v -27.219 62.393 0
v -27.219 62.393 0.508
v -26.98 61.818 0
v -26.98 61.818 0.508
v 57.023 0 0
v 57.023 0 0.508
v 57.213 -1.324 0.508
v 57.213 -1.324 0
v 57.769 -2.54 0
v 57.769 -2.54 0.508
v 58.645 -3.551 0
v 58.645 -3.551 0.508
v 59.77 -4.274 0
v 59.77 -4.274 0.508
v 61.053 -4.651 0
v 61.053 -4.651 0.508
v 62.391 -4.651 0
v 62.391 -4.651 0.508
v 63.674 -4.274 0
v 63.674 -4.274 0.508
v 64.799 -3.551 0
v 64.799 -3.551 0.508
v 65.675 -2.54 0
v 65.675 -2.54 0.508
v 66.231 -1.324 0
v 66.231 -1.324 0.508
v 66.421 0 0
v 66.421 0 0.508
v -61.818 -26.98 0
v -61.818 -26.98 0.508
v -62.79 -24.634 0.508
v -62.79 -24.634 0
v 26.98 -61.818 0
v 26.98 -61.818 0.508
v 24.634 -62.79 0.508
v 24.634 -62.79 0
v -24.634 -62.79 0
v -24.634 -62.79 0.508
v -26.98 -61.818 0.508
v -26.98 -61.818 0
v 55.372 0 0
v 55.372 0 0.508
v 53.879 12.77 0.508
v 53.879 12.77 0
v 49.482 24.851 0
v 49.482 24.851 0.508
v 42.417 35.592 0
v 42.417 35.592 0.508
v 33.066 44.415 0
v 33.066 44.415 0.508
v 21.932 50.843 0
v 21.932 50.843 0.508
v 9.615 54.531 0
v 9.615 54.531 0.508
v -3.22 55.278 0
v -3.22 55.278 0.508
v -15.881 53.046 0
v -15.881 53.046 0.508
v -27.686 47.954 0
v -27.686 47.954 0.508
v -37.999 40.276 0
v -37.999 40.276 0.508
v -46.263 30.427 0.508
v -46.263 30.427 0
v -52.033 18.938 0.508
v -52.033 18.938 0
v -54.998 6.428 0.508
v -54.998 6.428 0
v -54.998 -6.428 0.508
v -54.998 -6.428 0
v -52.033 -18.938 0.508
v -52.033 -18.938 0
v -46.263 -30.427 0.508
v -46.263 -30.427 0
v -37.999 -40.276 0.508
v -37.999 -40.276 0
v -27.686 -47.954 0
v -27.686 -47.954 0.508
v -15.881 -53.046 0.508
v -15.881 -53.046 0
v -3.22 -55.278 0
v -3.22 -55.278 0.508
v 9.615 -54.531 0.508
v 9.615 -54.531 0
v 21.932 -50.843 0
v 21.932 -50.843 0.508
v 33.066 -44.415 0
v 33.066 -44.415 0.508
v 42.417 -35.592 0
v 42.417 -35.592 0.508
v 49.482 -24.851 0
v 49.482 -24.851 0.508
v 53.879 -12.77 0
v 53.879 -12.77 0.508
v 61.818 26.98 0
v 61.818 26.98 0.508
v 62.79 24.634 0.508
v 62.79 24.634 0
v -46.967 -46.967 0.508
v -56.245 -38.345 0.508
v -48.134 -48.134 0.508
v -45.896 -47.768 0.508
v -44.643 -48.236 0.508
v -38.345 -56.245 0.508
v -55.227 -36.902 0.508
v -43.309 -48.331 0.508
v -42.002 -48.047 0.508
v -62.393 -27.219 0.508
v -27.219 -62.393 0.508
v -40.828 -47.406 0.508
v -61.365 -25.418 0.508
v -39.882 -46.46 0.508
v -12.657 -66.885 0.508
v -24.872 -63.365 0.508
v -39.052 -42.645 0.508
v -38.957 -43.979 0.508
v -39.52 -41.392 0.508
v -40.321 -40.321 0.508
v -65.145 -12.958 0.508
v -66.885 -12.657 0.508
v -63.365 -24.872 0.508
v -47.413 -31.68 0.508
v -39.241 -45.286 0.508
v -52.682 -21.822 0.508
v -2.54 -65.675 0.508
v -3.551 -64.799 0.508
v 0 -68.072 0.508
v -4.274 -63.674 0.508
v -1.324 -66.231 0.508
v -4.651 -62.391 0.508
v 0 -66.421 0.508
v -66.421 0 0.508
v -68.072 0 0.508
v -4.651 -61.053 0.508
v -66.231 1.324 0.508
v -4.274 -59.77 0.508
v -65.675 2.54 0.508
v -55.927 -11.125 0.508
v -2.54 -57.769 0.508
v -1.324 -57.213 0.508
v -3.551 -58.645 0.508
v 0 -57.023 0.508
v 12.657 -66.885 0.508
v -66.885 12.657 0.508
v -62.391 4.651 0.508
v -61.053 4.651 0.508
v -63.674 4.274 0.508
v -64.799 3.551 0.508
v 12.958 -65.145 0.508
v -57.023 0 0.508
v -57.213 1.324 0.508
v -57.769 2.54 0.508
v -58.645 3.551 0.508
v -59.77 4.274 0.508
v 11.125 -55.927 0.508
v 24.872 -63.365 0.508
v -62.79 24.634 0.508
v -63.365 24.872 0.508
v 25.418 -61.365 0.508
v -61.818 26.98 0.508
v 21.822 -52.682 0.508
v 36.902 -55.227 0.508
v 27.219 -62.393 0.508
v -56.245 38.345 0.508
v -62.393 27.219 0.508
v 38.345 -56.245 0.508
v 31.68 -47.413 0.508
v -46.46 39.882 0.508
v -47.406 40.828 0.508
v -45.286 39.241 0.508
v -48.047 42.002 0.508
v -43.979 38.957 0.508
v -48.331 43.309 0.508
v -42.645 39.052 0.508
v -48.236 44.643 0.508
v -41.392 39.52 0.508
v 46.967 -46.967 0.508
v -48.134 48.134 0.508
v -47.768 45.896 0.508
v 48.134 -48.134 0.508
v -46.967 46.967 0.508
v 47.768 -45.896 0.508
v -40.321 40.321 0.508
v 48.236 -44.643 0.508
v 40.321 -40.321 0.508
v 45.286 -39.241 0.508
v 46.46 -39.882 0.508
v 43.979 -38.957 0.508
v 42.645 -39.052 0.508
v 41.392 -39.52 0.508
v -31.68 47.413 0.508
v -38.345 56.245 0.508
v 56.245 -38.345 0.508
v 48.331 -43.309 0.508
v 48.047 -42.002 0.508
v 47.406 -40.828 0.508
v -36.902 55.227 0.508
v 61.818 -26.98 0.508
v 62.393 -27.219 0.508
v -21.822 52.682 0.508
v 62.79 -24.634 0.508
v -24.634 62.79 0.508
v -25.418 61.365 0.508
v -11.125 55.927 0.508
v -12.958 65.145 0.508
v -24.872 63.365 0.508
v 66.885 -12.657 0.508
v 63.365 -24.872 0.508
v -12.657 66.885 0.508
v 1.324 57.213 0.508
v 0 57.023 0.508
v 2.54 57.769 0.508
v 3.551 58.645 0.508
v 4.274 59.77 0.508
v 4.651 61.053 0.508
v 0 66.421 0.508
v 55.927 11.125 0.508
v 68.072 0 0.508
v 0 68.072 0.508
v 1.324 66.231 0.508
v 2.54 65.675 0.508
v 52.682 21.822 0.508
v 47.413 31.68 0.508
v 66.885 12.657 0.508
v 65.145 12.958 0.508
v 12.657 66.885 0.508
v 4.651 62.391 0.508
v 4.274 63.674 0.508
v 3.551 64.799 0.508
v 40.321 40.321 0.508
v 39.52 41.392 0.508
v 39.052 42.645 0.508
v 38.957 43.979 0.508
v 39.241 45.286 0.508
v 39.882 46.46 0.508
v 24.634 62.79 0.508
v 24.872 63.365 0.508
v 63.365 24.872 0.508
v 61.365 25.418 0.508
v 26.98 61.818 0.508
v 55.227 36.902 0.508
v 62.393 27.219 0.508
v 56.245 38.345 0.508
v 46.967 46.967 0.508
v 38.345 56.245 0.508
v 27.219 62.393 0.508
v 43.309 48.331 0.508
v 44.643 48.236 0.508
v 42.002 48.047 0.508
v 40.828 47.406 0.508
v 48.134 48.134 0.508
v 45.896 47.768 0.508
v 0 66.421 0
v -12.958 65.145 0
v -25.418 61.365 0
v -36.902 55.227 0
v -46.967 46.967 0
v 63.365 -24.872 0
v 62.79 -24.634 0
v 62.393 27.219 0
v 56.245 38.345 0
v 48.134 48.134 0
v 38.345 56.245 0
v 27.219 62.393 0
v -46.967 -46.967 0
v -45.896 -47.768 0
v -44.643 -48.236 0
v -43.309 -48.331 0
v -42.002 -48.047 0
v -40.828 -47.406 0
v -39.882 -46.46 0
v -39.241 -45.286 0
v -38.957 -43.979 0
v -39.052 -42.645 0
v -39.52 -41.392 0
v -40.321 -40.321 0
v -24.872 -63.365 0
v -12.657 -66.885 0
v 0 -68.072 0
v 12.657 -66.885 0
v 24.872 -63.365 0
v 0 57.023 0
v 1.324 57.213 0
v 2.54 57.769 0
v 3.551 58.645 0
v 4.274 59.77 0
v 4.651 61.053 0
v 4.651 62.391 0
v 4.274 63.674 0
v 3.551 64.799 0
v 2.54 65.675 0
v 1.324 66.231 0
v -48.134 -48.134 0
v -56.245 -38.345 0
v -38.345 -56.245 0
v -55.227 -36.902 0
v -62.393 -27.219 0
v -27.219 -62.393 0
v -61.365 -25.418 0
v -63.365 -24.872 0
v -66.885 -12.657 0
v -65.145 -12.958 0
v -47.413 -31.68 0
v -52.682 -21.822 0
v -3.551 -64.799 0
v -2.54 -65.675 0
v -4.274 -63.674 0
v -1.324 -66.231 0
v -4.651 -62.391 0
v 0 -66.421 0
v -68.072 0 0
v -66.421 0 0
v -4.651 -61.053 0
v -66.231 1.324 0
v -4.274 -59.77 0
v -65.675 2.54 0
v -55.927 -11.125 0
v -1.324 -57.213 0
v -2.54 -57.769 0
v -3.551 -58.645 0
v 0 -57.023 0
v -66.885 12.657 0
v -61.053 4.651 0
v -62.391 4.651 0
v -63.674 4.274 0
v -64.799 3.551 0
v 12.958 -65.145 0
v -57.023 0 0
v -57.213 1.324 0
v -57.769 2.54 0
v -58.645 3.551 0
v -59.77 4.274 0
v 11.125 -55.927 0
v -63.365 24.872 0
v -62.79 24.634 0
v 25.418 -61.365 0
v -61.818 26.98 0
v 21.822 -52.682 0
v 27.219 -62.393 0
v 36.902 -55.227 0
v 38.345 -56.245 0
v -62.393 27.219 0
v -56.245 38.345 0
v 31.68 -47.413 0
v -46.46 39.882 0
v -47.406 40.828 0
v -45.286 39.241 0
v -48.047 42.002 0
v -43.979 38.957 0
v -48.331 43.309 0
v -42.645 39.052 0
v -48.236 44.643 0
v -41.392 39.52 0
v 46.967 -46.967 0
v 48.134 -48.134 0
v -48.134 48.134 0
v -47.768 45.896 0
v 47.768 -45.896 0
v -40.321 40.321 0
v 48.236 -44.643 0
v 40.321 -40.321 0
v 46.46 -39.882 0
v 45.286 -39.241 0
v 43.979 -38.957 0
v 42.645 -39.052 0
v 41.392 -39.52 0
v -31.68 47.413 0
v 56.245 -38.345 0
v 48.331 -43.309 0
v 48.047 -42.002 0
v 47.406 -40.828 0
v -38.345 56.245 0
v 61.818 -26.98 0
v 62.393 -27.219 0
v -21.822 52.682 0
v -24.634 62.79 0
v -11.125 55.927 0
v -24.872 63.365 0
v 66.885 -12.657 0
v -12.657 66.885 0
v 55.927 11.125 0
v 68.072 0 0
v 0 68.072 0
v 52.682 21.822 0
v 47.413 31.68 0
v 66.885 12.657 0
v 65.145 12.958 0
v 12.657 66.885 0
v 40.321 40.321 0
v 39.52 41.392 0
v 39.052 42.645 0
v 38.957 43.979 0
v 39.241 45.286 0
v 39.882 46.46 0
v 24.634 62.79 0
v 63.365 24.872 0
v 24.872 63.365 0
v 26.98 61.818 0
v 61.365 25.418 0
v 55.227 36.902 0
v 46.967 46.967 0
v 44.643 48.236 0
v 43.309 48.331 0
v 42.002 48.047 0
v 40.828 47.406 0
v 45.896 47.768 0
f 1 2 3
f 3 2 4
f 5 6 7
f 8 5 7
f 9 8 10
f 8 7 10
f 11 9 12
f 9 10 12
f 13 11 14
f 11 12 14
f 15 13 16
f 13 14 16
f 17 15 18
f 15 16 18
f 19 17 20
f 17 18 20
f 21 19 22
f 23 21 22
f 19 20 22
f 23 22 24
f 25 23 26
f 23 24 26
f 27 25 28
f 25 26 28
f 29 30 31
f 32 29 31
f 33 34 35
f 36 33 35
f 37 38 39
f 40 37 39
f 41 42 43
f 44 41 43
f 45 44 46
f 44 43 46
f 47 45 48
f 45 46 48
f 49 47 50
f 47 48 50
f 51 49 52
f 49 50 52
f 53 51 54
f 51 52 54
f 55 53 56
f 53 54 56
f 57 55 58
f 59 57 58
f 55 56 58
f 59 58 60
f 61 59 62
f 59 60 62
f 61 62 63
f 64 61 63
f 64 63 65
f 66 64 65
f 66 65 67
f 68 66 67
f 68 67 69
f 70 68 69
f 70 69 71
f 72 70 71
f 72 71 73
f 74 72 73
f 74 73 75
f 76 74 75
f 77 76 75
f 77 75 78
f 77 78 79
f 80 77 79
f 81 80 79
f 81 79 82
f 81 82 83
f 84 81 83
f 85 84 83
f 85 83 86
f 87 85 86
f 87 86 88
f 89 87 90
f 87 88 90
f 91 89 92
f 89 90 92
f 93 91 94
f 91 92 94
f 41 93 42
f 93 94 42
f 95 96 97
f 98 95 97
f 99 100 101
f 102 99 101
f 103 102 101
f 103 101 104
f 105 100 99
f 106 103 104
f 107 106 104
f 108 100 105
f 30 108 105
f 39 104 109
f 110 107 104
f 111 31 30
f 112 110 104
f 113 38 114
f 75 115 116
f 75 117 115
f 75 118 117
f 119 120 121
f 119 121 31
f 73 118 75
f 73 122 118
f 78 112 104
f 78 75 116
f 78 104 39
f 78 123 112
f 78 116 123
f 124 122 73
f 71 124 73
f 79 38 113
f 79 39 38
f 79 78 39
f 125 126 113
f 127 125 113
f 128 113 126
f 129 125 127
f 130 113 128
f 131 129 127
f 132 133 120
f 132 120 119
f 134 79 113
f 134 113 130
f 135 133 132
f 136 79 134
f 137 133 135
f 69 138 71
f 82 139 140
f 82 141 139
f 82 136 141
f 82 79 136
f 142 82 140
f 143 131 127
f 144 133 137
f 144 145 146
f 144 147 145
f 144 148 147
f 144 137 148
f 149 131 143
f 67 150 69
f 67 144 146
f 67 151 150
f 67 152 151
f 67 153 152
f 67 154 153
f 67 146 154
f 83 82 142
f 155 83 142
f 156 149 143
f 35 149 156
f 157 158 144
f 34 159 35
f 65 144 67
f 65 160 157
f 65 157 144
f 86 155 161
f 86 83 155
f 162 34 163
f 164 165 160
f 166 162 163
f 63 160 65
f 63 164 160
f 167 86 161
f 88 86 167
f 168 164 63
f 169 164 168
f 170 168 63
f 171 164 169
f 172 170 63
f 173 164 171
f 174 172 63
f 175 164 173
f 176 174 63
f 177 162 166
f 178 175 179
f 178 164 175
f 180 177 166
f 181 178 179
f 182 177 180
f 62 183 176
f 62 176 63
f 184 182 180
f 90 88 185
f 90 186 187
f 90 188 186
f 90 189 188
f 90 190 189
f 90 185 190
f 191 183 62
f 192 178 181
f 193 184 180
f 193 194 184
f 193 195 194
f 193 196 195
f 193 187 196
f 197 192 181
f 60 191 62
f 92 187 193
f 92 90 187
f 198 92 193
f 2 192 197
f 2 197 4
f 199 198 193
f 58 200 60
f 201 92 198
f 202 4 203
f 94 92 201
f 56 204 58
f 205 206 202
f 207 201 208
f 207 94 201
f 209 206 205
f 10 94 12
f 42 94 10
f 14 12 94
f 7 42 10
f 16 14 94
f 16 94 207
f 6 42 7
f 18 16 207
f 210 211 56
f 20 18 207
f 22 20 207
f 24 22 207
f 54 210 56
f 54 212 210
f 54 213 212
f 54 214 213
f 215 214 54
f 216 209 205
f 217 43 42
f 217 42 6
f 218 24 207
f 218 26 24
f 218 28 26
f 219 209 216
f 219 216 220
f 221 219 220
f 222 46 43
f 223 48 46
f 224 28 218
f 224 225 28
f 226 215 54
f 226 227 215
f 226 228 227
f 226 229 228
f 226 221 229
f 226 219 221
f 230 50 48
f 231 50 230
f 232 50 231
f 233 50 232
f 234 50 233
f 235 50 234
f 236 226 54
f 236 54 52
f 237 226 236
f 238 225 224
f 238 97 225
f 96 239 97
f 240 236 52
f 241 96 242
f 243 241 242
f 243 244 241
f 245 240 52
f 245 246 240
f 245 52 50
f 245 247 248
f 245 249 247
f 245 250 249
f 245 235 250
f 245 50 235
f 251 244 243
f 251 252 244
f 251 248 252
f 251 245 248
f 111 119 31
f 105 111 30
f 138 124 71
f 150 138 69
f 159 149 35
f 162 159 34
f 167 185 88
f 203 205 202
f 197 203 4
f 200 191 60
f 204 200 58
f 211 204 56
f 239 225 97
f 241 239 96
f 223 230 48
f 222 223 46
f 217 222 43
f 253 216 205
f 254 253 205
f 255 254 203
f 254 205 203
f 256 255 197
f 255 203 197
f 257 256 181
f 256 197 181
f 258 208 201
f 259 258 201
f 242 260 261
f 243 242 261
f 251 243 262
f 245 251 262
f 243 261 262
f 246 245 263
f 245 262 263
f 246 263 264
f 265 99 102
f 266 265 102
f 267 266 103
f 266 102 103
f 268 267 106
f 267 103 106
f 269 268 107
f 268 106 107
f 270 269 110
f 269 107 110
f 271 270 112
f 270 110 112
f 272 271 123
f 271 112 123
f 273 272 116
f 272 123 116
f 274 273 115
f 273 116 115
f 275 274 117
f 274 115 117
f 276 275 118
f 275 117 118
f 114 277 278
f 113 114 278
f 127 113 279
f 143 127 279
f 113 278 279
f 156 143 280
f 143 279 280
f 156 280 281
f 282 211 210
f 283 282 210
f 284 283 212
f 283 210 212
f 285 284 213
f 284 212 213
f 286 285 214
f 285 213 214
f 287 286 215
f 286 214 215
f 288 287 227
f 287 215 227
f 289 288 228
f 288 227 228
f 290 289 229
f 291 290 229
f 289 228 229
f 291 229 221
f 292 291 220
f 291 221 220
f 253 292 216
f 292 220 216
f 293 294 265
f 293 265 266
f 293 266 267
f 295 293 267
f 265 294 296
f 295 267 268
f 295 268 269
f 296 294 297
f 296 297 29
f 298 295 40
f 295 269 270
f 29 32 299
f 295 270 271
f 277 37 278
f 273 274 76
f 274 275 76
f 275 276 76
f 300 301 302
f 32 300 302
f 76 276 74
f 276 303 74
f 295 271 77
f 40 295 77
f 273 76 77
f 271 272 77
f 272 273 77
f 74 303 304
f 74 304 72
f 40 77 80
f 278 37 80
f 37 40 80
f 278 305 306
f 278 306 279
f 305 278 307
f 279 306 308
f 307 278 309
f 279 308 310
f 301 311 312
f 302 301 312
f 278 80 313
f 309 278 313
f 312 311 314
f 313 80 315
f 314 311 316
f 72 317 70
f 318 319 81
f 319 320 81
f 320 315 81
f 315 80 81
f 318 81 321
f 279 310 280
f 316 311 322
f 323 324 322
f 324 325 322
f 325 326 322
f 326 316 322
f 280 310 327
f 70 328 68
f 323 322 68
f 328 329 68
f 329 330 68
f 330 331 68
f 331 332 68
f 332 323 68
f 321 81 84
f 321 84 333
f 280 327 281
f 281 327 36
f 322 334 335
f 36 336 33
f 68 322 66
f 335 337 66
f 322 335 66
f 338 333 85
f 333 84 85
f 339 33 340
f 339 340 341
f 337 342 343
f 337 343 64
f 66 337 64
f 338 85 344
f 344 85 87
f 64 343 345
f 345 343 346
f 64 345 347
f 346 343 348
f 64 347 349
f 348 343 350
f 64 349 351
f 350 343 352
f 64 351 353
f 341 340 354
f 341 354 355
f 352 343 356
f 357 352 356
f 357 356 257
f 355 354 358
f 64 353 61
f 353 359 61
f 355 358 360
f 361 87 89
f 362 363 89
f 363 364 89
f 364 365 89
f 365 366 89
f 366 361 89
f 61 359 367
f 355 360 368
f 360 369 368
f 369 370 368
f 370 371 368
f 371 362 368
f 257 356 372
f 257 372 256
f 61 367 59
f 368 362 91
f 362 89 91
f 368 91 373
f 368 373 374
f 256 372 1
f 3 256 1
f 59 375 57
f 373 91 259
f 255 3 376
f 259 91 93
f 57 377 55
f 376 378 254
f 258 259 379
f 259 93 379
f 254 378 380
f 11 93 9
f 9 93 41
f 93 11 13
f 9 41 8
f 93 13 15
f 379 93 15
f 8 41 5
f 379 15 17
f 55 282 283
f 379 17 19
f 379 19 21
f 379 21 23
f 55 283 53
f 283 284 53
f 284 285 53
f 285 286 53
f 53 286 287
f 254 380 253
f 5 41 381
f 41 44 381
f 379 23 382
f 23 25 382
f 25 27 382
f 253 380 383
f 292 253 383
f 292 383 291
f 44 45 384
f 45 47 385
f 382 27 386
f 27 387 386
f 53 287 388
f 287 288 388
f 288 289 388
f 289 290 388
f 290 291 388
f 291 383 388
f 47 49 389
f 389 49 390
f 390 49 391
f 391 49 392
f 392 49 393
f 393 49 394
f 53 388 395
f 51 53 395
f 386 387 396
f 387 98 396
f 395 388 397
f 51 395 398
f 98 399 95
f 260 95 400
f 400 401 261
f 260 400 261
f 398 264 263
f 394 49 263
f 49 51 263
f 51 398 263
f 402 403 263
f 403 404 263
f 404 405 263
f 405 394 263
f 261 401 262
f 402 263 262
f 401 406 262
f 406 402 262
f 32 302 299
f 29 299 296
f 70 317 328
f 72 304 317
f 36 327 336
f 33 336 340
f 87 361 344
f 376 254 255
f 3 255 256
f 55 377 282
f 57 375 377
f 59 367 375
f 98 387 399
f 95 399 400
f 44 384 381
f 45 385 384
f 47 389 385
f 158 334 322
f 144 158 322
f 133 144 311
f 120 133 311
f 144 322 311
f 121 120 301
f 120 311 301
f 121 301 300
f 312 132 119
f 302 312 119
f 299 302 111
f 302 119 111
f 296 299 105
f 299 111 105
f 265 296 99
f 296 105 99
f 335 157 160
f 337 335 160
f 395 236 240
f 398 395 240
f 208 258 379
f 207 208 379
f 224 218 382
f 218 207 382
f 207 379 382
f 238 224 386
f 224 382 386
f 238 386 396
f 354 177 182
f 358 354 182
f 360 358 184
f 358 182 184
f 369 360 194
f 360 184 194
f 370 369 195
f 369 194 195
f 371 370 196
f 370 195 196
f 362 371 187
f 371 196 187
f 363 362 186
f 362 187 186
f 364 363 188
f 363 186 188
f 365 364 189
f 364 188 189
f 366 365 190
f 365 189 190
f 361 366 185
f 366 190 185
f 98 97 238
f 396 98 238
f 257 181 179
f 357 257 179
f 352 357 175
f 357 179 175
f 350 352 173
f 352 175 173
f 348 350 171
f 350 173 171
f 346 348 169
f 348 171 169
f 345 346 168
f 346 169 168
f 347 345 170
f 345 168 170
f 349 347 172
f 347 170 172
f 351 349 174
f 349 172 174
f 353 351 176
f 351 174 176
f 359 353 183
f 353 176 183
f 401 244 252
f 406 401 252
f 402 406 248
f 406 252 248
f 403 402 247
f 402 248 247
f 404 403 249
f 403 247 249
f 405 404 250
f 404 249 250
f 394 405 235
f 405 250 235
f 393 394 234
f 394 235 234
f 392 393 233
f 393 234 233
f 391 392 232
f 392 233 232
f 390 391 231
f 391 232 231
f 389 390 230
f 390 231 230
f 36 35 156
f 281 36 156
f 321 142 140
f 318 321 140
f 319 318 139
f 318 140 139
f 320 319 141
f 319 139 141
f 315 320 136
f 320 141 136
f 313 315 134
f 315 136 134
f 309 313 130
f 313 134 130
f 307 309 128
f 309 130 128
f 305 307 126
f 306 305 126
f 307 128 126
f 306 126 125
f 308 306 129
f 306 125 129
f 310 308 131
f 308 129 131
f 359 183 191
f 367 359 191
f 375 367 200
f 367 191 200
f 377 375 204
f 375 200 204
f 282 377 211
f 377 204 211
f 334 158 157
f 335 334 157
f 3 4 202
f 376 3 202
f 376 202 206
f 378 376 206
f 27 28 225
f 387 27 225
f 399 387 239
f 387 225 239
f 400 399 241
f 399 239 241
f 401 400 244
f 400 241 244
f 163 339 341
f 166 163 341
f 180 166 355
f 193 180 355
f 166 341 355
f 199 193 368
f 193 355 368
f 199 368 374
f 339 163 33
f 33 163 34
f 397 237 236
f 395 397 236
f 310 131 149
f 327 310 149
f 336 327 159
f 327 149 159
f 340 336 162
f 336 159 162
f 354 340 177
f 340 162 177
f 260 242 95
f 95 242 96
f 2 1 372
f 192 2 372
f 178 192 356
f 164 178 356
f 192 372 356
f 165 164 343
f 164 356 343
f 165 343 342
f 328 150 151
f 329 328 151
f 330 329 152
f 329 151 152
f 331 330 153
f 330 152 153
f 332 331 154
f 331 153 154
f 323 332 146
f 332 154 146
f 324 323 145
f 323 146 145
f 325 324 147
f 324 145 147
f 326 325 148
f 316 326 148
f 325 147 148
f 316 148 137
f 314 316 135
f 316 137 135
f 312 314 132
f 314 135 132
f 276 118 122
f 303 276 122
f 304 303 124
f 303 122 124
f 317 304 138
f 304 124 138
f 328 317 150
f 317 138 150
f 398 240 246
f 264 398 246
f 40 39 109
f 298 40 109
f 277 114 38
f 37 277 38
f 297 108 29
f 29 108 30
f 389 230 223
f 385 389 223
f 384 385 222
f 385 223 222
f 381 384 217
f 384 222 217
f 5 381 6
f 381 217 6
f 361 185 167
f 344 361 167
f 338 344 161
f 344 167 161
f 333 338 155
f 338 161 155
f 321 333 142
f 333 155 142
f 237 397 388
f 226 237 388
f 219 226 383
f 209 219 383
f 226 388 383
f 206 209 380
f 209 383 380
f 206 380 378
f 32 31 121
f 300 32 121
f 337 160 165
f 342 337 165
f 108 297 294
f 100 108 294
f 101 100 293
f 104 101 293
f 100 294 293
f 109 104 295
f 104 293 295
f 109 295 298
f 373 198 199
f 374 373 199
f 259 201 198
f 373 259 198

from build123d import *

# Parameters (mm, degrees)
SKETCH4_R           = 68.072
BOSS_EXTRUDE2_DEPTH = 0.508
SKETCH5_R           = 55.372
CUT_EXTRUDE5_DEPTH  = 1.508
CUT_EXTRUDE6_DEPTH  = 1.508
CUT_EXTRUDE11_DEPTH = 1.508


with BuildPart() as part:
    # Sketch4 → Boss-Extrude2 (new body)
    with BuildSketch(Plane.XY):
        Circle(SKETCH4_R)
    extrude(amount=BOSS_EXTRUDE2_DEPTH)

    # Sketch5 → Cut-Extrude5 (cut, through all)
    with BuildSketch(Plane.XY.offset(0.508)):
        Circle(SKETCH5_R)
    extrude(amount=-CUT_EXTRUDE5_DEPTH, mode=Mode.SUBTRACT)

    # Sketch6 → Cut-Extrude6 (cut, through all)
    with BuildSketch(Plane.XY.offset(0.508)):
        with BuildLine():
            ThreePointArc((46.966739661, 46.966739366), (40.321349994, 46.966739524), (40.32135011, 40.321349857))
            ThreePointArc((40.32135011, 40.321349857), (52.682382823, 21.821756782), (57.023, -1.08e-06))
            ThreePointArc((57.023, -1.08e-06), (61.721999911, -4.699), (66.421, -1.258e-06))
            ThreePointArc((66.421, -1.258e-06), (61.36500271, 25.418215583), (46.966739661, 46.966739366))
        make_face()
        with BuildLine():
            ThreePointArc((46.966739366, -46.966739661), (46.966739524, -40.321349994), (40.321349857, -40.32135011))
            ThreePointArc((40.321349857, -40.32135011), (21.821756782, -52.682382823), (-1.08e-06, -57.023))
            ThreePointArc((-1.08e-06, -57.023), (-4.699, -61.721999911), (-1.258e-06, -66.421))
            ThreePointArc((-1.258e-06, -66.421), (25.418215583, -61.36500271), (46.966739366, -46.966739661))
        make_face()
        with BuildLine():
            ThreePointArc((-46.966739661, -46.966739366), (-40.321349994, -46.966739524), (-40.32135011, -40.321349857))
            ThreePointArc((-40.32135011, -40.321349857), (-52.682382823, -21.821756782), (-57.023, 1.08e-06))
            ThreePointArc((-57.023, 1.08e-06), (-61.721999911, 4.699), (-66.421, 1.258e-06))
            ThreePointArc((-66.421, 1.258e-06), (-61.36500271, -25.418215583), (-46.966739661, -46.966739366))
        make_face()
        with BuildLine():
            ThreePointArc((-46.966739366, 46.966739661), (-46.966739524, 40.321349994), (-40.321349857, 40.32135011))
            ThreePointArc((-40.321349857, 40.32135011), (-21.821756782, 52.682382823), (1.08e-06, 57.023))
            ThreePointArc((1.08e-06, 57.023), (4.699, 61.721999911), (1.258e-06, 66.421))
            ThreePointArc((1.258e-06, 66.421), (-25.418215583, 61.36500271), (-46.966739366, 46.966739661))
        make_face()
    extrude(amount=-CUT_EXTRUDE6_DEPTH, mode=Mode.SUBTRACT)

    # Sketch8 → Cut-Extrude11 (cut, through all)
    with BuildSketch(Plane.XY.offset(0.508)):
        Polygon((63.962998999, 25.119703581), (62.990983081, 27.466357594), (61.817656075, 26.980349635), (62.789671993, 24.633695622), align=None)
        Polygon((-25.119703581, 63.962998999), (-27.466357594, 62.990983081), (-26.980349635, 61.817656075), (-24.633695622, 62.789671993), align=None)
        Polygon((-62.990983081, 27.466357594), (-63.962998999, 25.119703581), (-62.789671993, 24.633695622), (-61.817656075, 26.980349635), align=None)
        Polygon((-63.962998999, -25.119703581), (-62.990983081, -27.466357594), (-61.817656075, -26.980349635), (-62.789671993, -24.633695622), align=None)
        Polygon((-27.466357594, -62.990983081), (-25.119703581, -63.962998999), (-24.633695622, -62.789671993), (-26.980349635, -61.817656075), align=None)
        Polygon((25.119703581, -63.962998999), (27.466357594, -62.990983081), (26.980349635, -61.817656075), (24.633695622, -62.789671993), align=None)
        Polygon((62.990983081, -27.466357594), (63.962998999, -25.119703581), (62.789671993, -24.633695622), (61.817656075, -26.980349635), align=None)
        Polygon((27.466357594, 62.990983081), (25.119703581, 63.962998999), (24.633695622, 62.789671993), (26.980349635, 61.817656075), align=None)
    extrude(amount=-CUT_EXTRUDE11_DEPTH, mode=Mode.SUBTRACT)


solid = part.part
